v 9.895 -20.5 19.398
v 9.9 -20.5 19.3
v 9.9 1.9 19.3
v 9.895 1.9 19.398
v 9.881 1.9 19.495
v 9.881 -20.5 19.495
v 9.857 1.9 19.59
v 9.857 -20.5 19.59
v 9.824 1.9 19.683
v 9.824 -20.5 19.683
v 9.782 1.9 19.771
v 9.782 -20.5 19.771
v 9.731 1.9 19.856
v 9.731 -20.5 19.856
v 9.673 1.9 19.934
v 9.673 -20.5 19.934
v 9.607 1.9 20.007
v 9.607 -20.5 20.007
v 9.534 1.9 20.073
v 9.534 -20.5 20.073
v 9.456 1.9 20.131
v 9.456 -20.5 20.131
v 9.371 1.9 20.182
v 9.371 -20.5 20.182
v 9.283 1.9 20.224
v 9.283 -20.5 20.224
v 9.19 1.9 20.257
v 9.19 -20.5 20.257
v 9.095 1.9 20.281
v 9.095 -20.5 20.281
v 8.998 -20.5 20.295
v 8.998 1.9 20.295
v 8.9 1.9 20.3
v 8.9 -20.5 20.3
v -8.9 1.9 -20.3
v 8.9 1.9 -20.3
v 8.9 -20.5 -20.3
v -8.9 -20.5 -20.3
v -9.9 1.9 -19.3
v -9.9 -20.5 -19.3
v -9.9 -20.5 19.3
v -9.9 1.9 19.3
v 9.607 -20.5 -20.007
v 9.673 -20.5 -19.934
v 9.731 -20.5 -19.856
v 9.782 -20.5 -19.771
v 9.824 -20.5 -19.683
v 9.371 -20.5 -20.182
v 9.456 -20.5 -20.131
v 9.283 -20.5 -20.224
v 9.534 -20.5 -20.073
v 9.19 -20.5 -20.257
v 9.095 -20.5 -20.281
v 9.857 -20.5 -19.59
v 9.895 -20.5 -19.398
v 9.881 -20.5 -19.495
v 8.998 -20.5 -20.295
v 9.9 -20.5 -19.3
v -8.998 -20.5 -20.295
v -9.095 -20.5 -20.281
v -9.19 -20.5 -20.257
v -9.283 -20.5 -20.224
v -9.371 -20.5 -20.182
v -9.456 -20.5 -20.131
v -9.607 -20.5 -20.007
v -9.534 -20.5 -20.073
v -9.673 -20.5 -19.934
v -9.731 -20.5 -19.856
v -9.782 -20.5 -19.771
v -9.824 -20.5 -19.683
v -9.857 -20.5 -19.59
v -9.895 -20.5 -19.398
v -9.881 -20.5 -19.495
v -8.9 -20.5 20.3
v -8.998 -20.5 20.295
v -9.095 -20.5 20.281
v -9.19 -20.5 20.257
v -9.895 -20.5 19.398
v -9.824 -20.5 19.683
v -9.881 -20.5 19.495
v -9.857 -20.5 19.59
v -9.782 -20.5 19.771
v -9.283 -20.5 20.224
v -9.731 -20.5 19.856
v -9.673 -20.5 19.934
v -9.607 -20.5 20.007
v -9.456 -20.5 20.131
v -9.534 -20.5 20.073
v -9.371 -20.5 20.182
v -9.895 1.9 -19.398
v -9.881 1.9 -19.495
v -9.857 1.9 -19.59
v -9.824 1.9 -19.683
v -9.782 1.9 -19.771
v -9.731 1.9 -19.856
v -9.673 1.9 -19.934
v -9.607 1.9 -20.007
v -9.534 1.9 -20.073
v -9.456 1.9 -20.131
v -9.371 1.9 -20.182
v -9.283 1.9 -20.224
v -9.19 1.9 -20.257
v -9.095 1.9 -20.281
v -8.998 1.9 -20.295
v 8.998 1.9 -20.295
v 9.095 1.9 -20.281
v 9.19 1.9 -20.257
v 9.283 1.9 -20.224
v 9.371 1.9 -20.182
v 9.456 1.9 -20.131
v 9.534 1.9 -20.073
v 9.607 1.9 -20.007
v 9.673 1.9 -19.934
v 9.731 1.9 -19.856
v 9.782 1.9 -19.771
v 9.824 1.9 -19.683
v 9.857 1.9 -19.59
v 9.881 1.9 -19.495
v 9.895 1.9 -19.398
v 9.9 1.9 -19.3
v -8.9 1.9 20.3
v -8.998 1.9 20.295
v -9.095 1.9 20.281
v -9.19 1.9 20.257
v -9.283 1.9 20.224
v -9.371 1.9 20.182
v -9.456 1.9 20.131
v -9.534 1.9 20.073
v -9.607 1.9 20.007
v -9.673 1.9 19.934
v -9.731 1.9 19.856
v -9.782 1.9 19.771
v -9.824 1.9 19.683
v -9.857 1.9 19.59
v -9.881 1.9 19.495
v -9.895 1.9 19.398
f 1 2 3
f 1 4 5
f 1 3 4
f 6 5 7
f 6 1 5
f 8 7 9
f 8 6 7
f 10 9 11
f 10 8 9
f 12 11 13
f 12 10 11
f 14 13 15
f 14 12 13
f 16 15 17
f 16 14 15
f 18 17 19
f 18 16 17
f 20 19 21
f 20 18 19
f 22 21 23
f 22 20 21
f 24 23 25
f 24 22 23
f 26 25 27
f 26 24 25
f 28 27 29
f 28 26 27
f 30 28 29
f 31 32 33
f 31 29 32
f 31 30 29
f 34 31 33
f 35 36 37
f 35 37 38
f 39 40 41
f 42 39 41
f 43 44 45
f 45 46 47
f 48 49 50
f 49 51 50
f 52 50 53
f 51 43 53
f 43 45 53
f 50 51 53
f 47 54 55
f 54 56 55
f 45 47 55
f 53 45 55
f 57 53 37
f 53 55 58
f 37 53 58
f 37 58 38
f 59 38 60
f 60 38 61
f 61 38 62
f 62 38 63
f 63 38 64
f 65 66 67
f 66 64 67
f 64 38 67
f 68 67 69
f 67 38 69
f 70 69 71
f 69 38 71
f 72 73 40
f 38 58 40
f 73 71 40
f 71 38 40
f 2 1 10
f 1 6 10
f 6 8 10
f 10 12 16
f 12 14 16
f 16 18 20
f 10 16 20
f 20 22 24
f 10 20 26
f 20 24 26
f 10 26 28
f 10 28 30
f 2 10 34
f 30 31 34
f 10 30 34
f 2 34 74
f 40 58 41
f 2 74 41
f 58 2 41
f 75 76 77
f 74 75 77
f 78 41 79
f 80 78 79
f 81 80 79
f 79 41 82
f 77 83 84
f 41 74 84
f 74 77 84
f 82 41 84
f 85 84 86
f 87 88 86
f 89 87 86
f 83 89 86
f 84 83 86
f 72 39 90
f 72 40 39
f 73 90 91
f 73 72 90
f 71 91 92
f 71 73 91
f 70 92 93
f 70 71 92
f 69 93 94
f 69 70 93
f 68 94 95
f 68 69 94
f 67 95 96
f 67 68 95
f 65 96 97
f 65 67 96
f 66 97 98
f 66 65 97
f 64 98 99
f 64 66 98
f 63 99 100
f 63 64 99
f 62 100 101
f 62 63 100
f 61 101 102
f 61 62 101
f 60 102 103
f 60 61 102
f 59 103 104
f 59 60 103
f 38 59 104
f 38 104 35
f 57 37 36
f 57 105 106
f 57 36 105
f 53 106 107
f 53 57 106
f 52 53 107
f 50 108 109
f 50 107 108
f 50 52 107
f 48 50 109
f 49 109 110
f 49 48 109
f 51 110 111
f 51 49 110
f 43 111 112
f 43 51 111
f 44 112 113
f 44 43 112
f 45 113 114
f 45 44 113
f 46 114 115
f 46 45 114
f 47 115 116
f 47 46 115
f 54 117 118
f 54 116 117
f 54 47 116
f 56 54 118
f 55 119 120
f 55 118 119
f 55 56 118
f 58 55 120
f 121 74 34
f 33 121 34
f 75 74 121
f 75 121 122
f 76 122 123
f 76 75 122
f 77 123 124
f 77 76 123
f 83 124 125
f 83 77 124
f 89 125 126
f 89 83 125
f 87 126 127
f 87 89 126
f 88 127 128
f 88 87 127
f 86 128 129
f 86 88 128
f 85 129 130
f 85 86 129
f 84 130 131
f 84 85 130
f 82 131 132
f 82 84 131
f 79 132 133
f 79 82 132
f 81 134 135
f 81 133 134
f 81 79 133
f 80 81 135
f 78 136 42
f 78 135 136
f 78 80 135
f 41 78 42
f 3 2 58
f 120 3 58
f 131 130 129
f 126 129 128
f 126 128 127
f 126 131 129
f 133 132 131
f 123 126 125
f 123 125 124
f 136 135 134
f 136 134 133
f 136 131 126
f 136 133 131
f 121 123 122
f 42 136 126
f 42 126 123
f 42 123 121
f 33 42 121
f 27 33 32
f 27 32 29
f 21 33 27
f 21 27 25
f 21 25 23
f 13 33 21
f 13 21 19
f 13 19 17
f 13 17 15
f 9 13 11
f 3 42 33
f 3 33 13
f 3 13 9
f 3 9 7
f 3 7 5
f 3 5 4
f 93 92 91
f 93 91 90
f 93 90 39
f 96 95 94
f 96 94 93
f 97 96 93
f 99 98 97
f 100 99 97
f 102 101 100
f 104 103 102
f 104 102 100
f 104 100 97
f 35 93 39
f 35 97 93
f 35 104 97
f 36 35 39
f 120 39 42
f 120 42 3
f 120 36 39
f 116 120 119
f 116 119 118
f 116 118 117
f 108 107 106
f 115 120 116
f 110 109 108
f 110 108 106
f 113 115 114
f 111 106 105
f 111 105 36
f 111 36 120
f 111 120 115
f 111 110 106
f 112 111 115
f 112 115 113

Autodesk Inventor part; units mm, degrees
ref_plane "YZ Plane" through (0, 0, 0) normal (1, 0, 0) x (0, 1, 0)
ref_plane "XZ Plane" through (0, 0, 0) normal (0, 1, 0) x (-1, 0, 0)
ref_plane "XY Plane" through (0, 0, 0) normal (0, 0, 1) x (1, 0, 0)
sketch "Boceto1" plane through (0, 0, 0) normal (0, 1, 0) x (-1, 0, 0)
  line L0 (9.9, 20.3) -> (-9.9, 20.3)
  line L1 (-9.9, 20.3) -> (-9.9, -20.3)
  line L2 (-9.9, -20.3) -> (9.9, -20.3)
  line L3 (9.9, -20.3) -> (9.9, 20.3)
  line L4 (9.9, 20.3) -> (-9.9, -20.3) construction
  line L5 (-9.9, 20.3) -> (9.9, -20.3) construction
  point P0 (0, 0)
  dimension "d0" = 19.8
  dimension "d1" = 40.6
extrude "Extrusión1" add sketch "Boceto1" against normal blind 20.5
fillet "Empalme1" radius 1 4 edges at (9.9, -10.25, 20.3) (-9.9, -10.25, 20.3) (9.9, -10.25, -20.3) (-9.9, -10.25, -20.3)
sketch "Sketch2" plane through (0, 0, 0) normal (0, 1, 0) x (1, 0, 0)
  arc A0 (-8.9, 20.3) -> (-9.9, 19.3) centre (-8.9, 19.3) ccw projected
  line L0 (-9.9, 19.3) -> (-9.9, -19.3) projected
  arc A1 (-9.9, -19.3) -> (-8.9, -20.3) centre (-8.9, -19.3) ccw projected
  line L1 (-8.9, -20.3) -> (8.9, -20.3) projected
  arc A2 (8.9, -20.3) -> (9.9, -19.3) centre (8.9, -19.3) ccw projected
  line L2 (9.9, -19.3) -> (9.9, 19.3) projected
  arc A3 (9.9, 19.3) -> (8.9, 20.3) centre (8.9, 19.3) ccw projected
  line L3 (8.9, 20.3) -> (-8.9, 20.3) projected
  point P0 (0, 0)
extrude "Extrusion2" add sketch "Sketch2" along normal blind 1.9
properties part number "Medio" material "Aluminum 6061"
